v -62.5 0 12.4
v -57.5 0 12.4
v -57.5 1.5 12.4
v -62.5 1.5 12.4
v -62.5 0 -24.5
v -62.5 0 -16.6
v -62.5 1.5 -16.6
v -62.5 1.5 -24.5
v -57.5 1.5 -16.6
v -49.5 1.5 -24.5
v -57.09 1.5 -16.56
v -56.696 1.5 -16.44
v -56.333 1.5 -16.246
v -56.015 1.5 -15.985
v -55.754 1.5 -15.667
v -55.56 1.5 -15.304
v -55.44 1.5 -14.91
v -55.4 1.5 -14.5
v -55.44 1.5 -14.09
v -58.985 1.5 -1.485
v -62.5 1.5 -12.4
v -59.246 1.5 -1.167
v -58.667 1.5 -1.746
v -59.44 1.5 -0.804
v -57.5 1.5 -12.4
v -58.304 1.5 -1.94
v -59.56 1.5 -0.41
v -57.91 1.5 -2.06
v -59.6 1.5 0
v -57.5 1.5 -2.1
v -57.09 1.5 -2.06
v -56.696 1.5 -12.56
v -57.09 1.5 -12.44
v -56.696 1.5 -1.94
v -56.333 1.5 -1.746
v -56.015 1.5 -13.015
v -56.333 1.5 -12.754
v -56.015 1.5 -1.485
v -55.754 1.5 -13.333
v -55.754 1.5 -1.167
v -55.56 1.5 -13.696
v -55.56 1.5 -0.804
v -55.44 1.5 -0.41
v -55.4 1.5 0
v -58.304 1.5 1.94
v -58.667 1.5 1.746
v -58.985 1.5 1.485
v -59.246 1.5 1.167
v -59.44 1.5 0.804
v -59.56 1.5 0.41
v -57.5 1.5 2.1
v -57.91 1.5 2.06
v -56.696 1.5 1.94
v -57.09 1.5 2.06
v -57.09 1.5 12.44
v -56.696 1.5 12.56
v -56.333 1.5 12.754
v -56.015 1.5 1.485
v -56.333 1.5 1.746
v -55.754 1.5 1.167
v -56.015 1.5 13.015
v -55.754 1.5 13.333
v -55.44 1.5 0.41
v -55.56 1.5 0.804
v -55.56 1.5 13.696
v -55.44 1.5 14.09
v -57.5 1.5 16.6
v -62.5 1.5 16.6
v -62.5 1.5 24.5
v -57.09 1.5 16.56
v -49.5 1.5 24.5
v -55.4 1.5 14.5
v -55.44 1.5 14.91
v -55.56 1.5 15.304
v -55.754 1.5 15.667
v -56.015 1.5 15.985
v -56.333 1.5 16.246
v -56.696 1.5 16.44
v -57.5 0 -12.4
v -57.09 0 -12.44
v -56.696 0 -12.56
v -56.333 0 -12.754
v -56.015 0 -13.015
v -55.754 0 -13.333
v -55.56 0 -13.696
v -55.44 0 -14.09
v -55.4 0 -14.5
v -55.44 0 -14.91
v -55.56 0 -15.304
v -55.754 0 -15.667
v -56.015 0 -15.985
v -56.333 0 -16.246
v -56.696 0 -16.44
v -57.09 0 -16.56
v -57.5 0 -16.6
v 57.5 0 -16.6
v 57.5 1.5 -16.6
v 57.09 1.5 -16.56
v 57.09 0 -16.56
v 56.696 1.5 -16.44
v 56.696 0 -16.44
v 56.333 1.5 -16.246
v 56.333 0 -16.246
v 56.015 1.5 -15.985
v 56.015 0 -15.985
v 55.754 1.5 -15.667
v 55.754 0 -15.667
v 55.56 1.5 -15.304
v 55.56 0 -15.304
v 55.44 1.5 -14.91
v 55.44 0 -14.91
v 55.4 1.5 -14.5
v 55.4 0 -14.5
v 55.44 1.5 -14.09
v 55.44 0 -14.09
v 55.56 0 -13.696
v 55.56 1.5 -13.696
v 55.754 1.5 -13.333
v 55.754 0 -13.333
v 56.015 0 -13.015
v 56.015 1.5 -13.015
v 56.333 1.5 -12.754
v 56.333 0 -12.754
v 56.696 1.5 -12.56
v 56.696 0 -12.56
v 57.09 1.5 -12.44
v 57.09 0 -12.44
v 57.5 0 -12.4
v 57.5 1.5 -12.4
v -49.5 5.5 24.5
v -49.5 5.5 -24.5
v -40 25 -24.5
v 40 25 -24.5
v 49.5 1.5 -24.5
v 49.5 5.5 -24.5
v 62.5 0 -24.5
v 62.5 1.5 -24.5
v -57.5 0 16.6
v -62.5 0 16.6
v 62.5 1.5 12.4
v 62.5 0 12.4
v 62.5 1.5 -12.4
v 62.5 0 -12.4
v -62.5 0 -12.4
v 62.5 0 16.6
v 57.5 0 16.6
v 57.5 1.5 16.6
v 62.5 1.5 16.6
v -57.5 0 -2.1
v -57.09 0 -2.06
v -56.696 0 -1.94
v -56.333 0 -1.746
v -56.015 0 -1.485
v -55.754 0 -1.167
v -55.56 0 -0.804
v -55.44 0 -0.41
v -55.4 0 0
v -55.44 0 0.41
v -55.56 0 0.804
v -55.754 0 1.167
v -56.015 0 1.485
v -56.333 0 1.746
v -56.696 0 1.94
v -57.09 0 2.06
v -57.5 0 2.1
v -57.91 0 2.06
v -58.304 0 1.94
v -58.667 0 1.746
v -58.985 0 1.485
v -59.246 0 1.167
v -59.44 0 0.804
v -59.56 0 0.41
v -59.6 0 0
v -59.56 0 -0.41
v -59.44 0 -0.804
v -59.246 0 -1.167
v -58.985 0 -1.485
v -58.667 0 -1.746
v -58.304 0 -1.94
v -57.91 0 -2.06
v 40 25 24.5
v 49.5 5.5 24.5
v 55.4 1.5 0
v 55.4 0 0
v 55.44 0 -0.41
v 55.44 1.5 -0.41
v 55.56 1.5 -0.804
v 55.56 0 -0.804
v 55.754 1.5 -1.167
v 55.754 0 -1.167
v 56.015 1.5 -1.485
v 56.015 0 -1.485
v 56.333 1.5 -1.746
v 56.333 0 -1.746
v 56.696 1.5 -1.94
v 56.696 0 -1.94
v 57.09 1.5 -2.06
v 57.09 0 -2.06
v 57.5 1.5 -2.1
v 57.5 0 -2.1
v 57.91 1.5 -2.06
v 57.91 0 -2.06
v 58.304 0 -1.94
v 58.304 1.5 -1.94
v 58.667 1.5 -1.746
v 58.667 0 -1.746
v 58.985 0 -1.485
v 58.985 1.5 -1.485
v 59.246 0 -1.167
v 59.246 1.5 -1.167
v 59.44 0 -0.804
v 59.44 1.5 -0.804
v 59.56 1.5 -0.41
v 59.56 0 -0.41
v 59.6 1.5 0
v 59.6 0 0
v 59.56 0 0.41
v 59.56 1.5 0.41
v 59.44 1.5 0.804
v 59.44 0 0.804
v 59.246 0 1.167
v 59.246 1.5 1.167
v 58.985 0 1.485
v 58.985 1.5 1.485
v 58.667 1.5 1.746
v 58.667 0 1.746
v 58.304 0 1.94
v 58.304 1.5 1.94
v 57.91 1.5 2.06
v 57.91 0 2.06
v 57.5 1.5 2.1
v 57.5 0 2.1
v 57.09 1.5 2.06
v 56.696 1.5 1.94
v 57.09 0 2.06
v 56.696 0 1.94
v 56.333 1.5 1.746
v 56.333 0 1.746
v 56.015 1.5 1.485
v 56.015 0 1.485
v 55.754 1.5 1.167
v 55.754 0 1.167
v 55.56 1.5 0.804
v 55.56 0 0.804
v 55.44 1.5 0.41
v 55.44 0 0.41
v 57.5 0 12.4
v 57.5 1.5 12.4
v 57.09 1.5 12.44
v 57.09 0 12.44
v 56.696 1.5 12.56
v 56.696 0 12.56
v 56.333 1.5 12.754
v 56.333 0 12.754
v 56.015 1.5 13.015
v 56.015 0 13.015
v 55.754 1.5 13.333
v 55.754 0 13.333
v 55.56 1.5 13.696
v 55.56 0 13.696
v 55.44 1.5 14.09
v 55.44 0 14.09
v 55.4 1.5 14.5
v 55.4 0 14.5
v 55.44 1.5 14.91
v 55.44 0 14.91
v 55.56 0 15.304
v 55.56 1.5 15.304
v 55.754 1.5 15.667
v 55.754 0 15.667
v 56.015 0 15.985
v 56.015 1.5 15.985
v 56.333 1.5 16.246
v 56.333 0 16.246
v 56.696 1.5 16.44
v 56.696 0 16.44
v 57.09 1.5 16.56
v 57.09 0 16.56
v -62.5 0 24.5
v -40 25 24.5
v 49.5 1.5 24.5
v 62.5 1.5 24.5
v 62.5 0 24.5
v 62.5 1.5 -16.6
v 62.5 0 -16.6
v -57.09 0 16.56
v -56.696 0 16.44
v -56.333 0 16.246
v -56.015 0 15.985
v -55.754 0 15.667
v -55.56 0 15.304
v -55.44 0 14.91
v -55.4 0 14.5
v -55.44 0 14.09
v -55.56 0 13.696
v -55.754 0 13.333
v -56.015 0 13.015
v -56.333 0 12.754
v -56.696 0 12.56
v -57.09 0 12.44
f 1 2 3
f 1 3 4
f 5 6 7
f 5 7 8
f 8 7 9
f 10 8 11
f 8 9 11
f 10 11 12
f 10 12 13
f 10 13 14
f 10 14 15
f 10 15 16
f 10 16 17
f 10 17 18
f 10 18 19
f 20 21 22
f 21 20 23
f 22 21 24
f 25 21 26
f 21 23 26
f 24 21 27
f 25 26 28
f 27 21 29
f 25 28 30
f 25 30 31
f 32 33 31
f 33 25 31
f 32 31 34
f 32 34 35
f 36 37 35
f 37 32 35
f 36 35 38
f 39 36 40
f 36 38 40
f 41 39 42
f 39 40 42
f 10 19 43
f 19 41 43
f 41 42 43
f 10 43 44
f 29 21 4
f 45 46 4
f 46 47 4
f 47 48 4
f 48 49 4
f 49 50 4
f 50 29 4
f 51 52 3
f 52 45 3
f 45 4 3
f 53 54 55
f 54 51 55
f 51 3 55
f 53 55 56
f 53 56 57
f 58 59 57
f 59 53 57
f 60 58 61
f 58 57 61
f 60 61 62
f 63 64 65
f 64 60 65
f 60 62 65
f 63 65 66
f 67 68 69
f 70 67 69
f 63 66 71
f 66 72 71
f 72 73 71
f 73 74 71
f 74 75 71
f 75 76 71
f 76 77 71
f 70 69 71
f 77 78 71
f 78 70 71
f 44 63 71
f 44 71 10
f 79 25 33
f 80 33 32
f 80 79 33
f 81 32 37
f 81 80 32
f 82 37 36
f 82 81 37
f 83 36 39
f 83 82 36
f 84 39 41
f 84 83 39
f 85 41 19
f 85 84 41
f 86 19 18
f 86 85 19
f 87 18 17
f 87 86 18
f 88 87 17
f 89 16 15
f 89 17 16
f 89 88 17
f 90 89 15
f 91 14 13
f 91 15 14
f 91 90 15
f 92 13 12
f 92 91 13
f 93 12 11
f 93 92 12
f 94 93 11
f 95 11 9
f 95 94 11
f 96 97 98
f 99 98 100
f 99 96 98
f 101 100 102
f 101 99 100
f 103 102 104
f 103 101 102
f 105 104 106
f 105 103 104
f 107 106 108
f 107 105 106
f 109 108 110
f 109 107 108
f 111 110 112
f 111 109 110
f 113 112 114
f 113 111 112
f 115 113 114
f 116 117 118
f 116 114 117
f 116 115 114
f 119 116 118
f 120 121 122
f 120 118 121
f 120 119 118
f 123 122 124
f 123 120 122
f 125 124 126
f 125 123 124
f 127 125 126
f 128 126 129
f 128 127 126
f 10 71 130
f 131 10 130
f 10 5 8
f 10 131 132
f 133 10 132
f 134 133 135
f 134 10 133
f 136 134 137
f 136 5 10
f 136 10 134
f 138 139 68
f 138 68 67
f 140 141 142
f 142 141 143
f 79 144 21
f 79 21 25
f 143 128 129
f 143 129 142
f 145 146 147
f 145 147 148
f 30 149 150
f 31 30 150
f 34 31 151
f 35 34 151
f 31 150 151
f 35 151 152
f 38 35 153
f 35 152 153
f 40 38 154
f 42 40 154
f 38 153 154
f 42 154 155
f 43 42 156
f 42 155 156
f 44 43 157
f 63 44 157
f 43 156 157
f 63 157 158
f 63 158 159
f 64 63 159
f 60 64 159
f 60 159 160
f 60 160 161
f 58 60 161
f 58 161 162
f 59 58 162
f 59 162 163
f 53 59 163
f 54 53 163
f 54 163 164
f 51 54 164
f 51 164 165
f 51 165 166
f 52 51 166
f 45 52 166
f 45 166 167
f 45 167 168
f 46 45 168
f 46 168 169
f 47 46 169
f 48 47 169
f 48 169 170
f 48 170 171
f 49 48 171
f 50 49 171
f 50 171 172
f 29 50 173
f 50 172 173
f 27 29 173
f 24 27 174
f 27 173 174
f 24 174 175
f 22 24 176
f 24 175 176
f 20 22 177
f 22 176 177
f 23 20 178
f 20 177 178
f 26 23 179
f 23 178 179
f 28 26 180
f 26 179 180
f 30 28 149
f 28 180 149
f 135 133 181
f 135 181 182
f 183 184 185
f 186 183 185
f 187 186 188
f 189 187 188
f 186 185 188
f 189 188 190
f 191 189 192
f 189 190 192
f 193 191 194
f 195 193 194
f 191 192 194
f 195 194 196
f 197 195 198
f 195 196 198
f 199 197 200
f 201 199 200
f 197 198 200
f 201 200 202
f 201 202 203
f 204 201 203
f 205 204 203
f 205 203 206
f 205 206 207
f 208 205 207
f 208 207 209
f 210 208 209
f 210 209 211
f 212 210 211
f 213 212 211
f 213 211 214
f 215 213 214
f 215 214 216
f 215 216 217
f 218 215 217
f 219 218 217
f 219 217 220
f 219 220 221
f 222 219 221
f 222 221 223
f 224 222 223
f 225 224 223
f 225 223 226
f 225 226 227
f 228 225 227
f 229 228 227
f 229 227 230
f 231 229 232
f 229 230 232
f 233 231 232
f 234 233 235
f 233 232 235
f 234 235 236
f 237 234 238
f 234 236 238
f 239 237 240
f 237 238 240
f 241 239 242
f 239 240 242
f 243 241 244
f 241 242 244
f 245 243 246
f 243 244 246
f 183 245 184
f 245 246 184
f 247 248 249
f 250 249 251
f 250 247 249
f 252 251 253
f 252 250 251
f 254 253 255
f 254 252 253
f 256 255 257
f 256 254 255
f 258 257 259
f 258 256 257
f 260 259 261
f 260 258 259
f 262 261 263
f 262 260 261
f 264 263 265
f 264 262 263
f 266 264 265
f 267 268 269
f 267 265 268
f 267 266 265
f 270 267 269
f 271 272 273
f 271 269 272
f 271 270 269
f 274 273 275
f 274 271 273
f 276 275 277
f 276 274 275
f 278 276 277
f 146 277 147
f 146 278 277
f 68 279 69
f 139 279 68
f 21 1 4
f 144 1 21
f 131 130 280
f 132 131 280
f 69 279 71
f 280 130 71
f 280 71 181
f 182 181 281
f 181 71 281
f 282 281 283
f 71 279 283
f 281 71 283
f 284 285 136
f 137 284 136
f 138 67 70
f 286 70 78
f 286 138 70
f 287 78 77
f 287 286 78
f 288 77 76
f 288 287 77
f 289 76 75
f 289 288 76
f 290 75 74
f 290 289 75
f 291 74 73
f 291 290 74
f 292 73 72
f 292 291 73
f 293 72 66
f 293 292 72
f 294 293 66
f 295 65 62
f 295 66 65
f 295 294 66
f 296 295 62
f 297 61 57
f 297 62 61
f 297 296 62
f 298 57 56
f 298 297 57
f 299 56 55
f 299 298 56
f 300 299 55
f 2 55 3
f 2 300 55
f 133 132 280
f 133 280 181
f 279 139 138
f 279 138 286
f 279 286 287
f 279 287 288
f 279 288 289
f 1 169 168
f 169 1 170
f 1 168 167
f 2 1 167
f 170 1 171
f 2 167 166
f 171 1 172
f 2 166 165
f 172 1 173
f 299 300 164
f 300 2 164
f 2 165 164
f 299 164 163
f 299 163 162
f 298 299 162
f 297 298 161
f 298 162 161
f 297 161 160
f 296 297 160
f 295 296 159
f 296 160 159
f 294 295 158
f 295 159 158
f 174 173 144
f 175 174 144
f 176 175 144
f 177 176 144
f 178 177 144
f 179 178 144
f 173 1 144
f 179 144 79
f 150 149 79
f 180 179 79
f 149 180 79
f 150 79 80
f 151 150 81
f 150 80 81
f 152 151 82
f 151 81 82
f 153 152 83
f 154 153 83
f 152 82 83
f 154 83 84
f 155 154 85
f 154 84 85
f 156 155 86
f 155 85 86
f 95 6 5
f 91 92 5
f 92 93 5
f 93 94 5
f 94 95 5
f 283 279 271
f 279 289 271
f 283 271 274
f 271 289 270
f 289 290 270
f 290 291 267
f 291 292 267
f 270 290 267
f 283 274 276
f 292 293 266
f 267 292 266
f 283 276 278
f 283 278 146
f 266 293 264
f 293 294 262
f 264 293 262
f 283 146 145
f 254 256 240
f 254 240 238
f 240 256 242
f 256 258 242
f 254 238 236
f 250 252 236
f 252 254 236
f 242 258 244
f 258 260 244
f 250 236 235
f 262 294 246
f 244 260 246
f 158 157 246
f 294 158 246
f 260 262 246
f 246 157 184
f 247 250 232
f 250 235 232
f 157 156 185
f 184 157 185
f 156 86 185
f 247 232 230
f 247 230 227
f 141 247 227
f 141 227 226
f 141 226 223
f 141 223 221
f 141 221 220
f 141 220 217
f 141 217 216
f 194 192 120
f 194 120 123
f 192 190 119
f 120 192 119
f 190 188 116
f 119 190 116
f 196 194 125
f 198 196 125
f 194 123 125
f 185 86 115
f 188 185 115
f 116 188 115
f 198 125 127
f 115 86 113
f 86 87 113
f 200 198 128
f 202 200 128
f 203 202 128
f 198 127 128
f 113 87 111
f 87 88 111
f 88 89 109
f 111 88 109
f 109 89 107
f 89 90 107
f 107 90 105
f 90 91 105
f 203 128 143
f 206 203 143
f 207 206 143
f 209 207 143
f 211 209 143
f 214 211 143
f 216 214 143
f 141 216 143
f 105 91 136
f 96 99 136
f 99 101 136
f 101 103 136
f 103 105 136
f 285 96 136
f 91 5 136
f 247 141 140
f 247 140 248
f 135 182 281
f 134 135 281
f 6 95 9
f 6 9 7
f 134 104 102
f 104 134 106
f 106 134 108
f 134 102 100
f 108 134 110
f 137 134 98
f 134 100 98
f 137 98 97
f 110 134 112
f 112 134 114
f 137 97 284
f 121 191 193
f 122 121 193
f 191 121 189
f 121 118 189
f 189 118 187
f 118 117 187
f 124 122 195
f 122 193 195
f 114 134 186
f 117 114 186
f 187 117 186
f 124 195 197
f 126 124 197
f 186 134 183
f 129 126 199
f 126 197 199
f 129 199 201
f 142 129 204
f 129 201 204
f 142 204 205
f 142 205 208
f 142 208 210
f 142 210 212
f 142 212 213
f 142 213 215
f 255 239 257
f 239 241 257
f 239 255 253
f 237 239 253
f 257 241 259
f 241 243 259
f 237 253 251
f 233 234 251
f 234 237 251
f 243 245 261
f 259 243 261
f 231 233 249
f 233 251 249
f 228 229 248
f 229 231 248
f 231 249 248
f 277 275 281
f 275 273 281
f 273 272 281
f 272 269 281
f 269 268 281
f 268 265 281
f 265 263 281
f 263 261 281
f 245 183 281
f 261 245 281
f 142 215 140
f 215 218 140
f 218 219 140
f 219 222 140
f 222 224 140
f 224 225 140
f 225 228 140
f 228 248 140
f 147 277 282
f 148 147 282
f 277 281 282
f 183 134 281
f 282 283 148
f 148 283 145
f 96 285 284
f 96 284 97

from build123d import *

# Parameters (mm, degrees)
SKETCH_1_W          = 125
SKETCH_1_H          = 49
EXTRUDE_1_DEPTH     = 25
SKETCH_2_OUTSIDE_W  = 154.314
SKETCH_2_OUTSIDE_H  = 54.314
CUT_EXTRUDE_1_DEPTH = 84.260134518
SKETCH_3_R          = 2.1
CUT_EXTRUDE_2_DEPTH = 25


with BuildPart() as part:
    # 草图1 → 凸台-拉伸1 (new body)
    with BuildSketch(Plane(origin=(0, 0, 0), x_dir=(1, 0, 0), z_dir=(0, 1, 0))):
        Rectangle(SKETCH_1_W, SKETCH_1_H)
    extrude(amount=EXTRUDE_1_DEPTH)

    # 草图2 outside → 切除-拉伸1 (cut, through all)
    with BuildSketch(Plane.XY.offset(24.5)):
        with Locations((0, 12.5)):
            Rectangle(SKETCH_2_OUTSIDE_W, SKETCH_2_OUTSIDE_H)
        Polygon((-62.5, 1.5), (-49.5, 1.5), (-49.5, 5.5), (-40, 25), (40, 25), (49.5, 5.5), (49.5, 1.5), (62.5, 1.5), (62.5, 0), (-62.5, 0), align=None, mode=Mode.SUBTRACT)
    extrude(amount=-CUT_EXTRUDE_1_DEPTH, mode=Mode.SUBTRACT)

    # 草图3 → 切除-拉伸2 (cut)
    with BuildSketch(Plane.XZ):
        with Locations(Location((-57.5, 0, 0), (0, 0, 270))):
            Circle(SKETCH_3_R)
        with Locations(Location((57.5, 0, 0), (0, 0, 180))):
            Circle(SKETCH_3_R)
        with BuildLine():
            Line((-62.5, 16.6), (-57.5, 16.6))
            ThreePointArc((-57.5, 16.6), (-55.4, 14.5), (-57.5, 12.4))
            Line((-57.5, 12.4), (-62.5, 12.4))
            Line((-62.5, 12.4), (-62.5, 16.6))
        make_face()
        with BuildLine():
            Line((62.5, 16.6), (62.5, 12.4))
            Line((62.5, 12.4), (57.5, 12.4))
            ThreePointArc((57.5, 12.4), (55.4, 14.5), (57.5, 16.6))
            Line((57.5, 16.6), (62.5, 16.6))
        make_face()
        with BuildLine():
            Line((62.5, -16.6), (57.5, -16.6))
            ThreePointArc((57.5, -16.6), (55.4, -14.5), (57.5, -12.4))
            Line((57.5, -12.4), (62.5, -12.4))
            Line((62.5, -12.4), (62.5, -16.6))
        make_face()
        with BuildLine():
            Line((-62.5, -16.6), (-62.5, -12.4))
            Line((-62.5, -12.4), (-57.5, -12.4))
            ThreePointArc((-57.5, -12.4), (-55.4, -14.5), (-57.5, -16.6))
            Line((-57.5, -16.6), (-62.5, -16.6))
        make_face()
    extrude(amount=-CUT_EXTRUDE_2_DEPTH, mode=Mode.SUBTRACT)


solid = part.part
